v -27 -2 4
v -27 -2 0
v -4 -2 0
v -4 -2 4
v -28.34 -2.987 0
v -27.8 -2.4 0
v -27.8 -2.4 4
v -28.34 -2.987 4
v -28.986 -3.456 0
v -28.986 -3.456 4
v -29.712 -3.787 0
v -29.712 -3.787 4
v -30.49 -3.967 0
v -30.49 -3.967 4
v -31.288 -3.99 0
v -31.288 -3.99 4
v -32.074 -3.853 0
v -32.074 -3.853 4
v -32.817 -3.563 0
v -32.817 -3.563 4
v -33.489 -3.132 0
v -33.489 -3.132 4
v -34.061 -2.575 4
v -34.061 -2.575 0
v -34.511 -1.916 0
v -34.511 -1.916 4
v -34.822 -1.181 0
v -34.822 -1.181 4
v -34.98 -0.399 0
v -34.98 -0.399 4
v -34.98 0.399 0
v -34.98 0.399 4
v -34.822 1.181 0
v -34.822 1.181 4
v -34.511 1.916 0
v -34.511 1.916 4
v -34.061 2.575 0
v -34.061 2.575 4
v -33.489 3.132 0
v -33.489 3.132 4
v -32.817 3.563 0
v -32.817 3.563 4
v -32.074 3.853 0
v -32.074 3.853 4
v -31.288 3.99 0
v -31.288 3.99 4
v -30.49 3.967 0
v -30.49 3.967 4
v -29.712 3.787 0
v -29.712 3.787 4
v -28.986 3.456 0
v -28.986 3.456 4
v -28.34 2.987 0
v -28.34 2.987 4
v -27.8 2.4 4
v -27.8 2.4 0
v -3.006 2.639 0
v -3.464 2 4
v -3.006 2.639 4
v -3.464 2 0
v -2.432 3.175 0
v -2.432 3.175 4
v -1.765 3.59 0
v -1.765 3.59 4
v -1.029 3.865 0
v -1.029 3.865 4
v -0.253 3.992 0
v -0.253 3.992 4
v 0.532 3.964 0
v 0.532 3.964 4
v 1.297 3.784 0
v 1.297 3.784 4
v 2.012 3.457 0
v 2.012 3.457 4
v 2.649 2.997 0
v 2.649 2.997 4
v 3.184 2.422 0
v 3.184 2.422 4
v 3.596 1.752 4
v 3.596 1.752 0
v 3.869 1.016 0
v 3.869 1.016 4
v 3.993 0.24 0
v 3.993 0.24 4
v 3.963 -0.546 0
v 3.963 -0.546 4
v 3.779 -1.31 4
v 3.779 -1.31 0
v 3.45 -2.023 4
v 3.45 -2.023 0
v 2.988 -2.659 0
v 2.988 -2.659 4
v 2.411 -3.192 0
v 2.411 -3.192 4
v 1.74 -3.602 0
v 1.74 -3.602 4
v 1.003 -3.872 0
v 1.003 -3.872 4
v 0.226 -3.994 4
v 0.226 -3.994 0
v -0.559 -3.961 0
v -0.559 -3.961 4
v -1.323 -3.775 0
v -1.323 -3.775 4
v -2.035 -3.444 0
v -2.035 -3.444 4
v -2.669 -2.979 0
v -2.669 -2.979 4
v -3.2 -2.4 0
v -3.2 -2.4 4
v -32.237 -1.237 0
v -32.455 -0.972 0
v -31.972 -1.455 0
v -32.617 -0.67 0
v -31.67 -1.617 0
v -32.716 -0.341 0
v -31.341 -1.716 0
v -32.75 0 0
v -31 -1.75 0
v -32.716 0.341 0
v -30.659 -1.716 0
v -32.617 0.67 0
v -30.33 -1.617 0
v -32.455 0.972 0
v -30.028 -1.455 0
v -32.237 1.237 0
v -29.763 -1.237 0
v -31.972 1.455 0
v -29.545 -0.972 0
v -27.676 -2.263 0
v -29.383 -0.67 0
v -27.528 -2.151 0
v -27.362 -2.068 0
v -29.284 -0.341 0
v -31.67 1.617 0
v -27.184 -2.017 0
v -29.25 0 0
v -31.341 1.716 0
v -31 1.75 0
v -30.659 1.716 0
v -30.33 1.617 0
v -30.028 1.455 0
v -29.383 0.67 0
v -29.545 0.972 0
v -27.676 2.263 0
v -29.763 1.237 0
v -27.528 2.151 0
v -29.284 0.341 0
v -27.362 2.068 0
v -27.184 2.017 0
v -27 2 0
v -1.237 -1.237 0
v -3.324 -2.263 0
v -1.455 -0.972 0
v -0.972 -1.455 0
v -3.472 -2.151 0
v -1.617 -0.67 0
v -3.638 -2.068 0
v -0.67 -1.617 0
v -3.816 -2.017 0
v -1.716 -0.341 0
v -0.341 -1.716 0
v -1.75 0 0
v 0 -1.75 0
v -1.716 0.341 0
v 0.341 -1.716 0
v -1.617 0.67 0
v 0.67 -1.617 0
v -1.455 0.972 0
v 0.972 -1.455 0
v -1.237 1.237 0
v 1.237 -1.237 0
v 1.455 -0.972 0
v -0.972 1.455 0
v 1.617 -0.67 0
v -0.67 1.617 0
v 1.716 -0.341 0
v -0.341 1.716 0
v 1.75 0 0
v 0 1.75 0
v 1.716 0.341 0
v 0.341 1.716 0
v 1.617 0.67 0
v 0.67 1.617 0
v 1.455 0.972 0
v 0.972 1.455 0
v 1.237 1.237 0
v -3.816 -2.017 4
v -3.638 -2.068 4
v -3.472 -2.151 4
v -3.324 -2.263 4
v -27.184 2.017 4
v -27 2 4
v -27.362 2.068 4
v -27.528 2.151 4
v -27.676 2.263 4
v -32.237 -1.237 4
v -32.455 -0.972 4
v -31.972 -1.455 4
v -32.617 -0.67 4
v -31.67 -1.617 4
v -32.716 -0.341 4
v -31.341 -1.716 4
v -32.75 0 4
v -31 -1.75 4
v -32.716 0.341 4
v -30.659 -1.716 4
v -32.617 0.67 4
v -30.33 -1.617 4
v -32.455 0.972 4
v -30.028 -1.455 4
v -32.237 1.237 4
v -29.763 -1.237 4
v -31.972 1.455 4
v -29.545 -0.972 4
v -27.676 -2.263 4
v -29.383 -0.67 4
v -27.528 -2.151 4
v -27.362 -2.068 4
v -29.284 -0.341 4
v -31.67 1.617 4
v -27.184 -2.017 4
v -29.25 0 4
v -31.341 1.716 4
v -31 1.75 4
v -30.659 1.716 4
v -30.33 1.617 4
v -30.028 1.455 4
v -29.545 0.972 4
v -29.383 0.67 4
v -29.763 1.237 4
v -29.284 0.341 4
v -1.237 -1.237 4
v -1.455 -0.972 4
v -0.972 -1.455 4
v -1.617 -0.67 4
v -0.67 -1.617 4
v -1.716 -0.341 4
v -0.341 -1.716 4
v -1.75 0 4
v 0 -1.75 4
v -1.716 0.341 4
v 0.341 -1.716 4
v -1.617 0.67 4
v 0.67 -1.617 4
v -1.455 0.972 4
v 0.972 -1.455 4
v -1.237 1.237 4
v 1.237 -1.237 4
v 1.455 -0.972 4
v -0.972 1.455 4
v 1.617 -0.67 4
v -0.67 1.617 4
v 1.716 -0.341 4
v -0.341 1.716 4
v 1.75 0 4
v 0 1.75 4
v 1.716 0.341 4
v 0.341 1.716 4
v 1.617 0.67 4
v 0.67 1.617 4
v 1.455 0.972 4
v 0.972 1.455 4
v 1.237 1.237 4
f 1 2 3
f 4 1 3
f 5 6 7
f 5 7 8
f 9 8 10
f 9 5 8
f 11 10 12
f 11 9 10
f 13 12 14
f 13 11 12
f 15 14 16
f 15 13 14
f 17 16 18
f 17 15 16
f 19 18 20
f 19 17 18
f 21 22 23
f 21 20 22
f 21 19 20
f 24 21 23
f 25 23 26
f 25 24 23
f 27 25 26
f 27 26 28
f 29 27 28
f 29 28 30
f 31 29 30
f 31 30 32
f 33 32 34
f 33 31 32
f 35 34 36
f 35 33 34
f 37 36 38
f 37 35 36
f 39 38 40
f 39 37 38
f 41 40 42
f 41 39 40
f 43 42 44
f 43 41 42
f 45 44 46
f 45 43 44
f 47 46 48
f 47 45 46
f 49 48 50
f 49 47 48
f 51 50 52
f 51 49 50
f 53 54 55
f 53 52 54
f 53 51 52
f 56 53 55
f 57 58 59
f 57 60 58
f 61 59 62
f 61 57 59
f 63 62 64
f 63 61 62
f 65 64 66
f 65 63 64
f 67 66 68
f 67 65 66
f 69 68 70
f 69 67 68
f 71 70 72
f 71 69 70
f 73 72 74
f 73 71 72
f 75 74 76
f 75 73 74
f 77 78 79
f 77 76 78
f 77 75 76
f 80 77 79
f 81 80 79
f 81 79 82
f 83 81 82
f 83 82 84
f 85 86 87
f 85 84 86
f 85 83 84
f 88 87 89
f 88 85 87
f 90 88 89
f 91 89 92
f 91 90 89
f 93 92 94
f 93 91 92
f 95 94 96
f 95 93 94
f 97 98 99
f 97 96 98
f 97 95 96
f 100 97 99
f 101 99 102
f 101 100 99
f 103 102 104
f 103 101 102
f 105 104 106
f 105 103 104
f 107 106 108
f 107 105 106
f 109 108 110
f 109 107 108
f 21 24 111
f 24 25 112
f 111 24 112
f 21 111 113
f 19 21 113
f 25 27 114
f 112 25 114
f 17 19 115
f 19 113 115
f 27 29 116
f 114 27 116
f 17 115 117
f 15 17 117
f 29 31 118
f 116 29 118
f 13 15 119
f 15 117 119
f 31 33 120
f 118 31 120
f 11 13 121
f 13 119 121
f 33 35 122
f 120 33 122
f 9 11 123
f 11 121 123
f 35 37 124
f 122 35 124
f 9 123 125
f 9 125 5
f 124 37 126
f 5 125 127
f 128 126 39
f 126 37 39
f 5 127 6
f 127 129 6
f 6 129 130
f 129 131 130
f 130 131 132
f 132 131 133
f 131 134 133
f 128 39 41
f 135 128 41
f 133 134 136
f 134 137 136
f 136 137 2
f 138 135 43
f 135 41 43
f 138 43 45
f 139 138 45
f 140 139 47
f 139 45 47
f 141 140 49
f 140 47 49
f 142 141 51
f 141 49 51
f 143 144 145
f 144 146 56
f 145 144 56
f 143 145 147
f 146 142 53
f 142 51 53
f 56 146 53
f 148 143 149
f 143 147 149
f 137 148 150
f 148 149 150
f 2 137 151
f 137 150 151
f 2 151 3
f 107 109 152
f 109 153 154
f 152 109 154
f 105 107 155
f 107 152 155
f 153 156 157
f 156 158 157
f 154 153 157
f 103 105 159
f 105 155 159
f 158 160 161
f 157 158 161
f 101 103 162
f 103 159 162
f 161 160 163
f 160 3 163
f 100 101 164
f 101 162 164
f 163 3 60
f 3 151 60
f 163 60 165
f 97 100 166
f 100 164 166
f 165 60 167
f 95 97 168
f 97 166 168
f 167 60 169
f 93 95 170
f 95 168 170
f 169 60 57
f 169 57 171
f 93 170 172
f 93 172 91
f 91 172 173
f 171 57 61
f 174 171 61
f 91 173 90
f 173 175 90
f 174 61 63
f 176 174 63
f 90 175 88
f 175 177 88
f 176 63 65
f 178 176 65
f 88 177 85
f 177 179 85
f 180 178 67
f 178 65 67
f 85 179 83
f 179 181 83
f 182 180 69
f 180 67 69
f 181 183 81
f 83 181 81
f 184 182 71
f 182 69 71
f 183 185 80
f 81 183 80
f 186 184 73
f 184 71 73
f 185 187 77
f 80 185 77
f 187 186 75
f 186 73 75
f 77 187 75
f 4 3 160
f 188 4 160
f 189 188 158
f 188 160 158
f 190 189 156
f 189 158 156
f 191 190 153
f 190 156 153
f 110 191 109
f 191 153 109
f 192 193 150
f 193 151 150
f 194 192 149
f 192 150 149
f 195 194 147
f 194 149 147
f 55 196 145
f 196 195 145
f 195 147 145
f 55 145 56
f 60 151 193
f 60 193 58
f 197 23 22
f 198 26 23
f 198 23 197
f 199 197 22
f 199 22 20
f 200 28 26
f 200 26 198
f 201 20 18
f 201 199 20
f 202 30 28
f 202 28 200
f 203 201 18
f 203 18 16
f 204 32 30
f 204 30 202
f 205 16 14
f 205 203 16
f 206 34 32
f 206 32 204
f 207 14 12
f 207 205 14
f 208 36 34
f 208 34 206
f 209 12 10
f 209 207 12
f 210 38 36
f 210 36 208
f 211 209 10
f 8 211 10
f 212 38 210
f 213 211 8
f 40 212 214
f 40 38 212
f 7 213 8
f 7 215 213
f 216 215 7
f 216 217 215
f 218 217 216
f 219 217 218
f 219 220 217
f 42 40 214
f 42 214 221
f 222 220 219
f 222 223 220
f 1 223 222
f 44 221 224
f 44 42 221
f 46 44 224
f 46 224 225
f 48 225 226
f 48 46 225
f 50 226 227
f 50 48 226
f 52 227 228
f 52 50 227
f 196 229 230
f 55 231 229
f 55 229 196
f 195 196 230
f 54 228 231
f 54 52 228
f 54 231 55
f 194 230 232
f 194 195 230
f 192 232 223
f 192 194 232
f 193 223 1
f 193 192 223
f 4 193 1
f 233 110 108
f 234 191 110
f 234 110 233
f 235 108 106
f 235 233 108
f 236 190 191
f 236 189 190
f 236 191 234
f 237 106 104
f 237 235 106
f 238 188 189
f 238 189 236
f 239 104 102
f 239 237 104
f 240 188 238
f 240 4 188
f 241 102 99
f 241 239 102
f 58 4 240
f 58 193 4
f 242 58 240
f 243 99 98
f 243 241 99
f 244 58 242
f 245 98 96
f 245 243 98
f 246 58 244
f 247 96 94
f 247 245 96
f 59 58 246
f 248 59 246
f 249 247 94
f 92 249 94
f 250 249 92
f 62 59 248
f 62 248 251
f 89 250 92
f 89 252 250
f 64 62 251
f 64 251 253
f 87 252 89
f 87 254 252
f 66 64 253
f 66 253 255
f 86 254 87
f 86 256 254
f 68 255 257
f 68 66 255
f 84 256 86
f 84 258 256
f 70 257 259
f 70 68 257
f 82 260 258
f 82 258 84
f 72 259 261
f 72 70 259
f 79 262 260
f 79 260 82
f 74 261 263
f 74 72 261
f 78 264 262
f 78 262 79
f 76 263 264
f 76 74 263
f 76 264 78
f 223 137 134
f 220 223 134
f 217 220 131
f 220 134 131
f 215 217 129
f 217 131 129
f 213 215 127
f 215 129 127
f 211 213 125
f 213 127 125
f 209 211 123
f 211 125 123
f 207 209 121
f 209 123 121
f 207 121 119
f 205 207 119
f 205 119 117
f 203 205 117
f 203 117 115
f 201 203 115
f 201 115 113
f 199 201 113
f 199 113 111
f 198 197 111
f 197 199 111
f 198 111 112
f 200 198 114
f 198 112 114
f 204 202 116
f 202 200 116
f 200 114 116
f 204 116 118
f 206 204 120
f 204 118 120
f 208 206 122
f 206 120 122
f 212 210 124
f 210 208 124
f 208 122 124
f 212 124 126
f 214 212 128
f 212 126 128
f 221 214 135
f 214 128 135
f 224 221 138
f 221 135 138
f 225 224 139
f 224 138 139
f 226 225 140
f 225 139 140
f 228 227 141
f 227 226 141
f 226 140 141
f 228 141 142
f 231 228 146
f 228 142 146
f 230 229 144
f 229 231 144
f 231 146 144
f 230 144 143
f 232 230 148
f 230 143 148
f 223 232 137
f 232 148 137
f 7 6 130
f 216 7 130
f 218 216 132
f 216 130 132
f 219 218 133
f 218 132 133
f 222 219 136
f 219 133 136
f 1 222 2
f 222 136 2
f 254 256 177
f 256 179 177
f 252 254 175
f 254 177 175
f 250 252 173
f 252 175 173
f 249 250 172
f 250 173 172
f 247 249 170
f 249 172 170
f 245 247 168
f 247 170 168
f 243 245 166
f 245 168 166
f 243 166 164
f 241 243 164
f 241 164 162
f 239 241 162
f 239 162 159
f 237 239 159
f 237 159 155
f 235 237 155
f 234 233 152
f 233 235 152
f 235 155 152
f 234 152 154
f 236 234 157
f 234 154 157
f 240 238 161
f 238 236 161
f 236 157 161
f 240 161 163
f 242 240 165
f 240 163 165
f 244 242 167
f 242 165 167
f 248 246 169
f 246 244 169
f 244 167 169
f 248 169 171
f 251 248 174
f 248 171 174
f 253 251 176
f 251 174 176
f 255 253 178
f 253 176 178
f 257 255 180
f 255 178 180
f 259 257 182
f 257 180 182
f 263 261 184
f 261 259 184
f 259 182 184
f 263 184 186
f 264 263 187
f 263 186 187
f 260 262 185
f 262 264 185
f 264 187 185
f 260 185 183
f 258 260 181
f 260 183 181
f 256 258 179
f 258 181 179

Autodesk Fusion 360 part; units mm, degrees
sketch "Sketch1" plane through (0, 0, 0) normal (0, 0, 1) x (1, 0, 0)
  circle A0 centre (0, 0) radius 1.75
  circle A1 centre (-31, 0) radius 1.75
  line L0 (-27, -2) -> (-4, -2)
  line L1 (-27, 2) -> (-3.4641, 2)
  arc A2 (-27.8, 2.4) -> (-27.8, -2.4) centre (-31, 0) ccw
  arc A3 (-3.2, -2.4) -> (-3.4641, 2) centre (0, 0) ccw
  arc A4 (-27, -2) -> (-27.8, -2.4) centre (-27, -3) ccw
  arc A5 (-27.8, 2.4) -> (-27, 2) centre (-27, 3) ccw
  arc A6 (-3.2, -2.4) -> (-4, -2) centre (-4, -3) ccw
  point P0 (-31, 0)
  dimension "d7" = 8
  dimension "d8" = 3.5
  dimension "d9" = 8
  dimension "d10" = 3.5
  dimension "d11" = 1
  dimension "d12" = 1
  dimension "d13" = 1
extrude "Extrude1" add sketch "Sketch1" along normal blind 4
